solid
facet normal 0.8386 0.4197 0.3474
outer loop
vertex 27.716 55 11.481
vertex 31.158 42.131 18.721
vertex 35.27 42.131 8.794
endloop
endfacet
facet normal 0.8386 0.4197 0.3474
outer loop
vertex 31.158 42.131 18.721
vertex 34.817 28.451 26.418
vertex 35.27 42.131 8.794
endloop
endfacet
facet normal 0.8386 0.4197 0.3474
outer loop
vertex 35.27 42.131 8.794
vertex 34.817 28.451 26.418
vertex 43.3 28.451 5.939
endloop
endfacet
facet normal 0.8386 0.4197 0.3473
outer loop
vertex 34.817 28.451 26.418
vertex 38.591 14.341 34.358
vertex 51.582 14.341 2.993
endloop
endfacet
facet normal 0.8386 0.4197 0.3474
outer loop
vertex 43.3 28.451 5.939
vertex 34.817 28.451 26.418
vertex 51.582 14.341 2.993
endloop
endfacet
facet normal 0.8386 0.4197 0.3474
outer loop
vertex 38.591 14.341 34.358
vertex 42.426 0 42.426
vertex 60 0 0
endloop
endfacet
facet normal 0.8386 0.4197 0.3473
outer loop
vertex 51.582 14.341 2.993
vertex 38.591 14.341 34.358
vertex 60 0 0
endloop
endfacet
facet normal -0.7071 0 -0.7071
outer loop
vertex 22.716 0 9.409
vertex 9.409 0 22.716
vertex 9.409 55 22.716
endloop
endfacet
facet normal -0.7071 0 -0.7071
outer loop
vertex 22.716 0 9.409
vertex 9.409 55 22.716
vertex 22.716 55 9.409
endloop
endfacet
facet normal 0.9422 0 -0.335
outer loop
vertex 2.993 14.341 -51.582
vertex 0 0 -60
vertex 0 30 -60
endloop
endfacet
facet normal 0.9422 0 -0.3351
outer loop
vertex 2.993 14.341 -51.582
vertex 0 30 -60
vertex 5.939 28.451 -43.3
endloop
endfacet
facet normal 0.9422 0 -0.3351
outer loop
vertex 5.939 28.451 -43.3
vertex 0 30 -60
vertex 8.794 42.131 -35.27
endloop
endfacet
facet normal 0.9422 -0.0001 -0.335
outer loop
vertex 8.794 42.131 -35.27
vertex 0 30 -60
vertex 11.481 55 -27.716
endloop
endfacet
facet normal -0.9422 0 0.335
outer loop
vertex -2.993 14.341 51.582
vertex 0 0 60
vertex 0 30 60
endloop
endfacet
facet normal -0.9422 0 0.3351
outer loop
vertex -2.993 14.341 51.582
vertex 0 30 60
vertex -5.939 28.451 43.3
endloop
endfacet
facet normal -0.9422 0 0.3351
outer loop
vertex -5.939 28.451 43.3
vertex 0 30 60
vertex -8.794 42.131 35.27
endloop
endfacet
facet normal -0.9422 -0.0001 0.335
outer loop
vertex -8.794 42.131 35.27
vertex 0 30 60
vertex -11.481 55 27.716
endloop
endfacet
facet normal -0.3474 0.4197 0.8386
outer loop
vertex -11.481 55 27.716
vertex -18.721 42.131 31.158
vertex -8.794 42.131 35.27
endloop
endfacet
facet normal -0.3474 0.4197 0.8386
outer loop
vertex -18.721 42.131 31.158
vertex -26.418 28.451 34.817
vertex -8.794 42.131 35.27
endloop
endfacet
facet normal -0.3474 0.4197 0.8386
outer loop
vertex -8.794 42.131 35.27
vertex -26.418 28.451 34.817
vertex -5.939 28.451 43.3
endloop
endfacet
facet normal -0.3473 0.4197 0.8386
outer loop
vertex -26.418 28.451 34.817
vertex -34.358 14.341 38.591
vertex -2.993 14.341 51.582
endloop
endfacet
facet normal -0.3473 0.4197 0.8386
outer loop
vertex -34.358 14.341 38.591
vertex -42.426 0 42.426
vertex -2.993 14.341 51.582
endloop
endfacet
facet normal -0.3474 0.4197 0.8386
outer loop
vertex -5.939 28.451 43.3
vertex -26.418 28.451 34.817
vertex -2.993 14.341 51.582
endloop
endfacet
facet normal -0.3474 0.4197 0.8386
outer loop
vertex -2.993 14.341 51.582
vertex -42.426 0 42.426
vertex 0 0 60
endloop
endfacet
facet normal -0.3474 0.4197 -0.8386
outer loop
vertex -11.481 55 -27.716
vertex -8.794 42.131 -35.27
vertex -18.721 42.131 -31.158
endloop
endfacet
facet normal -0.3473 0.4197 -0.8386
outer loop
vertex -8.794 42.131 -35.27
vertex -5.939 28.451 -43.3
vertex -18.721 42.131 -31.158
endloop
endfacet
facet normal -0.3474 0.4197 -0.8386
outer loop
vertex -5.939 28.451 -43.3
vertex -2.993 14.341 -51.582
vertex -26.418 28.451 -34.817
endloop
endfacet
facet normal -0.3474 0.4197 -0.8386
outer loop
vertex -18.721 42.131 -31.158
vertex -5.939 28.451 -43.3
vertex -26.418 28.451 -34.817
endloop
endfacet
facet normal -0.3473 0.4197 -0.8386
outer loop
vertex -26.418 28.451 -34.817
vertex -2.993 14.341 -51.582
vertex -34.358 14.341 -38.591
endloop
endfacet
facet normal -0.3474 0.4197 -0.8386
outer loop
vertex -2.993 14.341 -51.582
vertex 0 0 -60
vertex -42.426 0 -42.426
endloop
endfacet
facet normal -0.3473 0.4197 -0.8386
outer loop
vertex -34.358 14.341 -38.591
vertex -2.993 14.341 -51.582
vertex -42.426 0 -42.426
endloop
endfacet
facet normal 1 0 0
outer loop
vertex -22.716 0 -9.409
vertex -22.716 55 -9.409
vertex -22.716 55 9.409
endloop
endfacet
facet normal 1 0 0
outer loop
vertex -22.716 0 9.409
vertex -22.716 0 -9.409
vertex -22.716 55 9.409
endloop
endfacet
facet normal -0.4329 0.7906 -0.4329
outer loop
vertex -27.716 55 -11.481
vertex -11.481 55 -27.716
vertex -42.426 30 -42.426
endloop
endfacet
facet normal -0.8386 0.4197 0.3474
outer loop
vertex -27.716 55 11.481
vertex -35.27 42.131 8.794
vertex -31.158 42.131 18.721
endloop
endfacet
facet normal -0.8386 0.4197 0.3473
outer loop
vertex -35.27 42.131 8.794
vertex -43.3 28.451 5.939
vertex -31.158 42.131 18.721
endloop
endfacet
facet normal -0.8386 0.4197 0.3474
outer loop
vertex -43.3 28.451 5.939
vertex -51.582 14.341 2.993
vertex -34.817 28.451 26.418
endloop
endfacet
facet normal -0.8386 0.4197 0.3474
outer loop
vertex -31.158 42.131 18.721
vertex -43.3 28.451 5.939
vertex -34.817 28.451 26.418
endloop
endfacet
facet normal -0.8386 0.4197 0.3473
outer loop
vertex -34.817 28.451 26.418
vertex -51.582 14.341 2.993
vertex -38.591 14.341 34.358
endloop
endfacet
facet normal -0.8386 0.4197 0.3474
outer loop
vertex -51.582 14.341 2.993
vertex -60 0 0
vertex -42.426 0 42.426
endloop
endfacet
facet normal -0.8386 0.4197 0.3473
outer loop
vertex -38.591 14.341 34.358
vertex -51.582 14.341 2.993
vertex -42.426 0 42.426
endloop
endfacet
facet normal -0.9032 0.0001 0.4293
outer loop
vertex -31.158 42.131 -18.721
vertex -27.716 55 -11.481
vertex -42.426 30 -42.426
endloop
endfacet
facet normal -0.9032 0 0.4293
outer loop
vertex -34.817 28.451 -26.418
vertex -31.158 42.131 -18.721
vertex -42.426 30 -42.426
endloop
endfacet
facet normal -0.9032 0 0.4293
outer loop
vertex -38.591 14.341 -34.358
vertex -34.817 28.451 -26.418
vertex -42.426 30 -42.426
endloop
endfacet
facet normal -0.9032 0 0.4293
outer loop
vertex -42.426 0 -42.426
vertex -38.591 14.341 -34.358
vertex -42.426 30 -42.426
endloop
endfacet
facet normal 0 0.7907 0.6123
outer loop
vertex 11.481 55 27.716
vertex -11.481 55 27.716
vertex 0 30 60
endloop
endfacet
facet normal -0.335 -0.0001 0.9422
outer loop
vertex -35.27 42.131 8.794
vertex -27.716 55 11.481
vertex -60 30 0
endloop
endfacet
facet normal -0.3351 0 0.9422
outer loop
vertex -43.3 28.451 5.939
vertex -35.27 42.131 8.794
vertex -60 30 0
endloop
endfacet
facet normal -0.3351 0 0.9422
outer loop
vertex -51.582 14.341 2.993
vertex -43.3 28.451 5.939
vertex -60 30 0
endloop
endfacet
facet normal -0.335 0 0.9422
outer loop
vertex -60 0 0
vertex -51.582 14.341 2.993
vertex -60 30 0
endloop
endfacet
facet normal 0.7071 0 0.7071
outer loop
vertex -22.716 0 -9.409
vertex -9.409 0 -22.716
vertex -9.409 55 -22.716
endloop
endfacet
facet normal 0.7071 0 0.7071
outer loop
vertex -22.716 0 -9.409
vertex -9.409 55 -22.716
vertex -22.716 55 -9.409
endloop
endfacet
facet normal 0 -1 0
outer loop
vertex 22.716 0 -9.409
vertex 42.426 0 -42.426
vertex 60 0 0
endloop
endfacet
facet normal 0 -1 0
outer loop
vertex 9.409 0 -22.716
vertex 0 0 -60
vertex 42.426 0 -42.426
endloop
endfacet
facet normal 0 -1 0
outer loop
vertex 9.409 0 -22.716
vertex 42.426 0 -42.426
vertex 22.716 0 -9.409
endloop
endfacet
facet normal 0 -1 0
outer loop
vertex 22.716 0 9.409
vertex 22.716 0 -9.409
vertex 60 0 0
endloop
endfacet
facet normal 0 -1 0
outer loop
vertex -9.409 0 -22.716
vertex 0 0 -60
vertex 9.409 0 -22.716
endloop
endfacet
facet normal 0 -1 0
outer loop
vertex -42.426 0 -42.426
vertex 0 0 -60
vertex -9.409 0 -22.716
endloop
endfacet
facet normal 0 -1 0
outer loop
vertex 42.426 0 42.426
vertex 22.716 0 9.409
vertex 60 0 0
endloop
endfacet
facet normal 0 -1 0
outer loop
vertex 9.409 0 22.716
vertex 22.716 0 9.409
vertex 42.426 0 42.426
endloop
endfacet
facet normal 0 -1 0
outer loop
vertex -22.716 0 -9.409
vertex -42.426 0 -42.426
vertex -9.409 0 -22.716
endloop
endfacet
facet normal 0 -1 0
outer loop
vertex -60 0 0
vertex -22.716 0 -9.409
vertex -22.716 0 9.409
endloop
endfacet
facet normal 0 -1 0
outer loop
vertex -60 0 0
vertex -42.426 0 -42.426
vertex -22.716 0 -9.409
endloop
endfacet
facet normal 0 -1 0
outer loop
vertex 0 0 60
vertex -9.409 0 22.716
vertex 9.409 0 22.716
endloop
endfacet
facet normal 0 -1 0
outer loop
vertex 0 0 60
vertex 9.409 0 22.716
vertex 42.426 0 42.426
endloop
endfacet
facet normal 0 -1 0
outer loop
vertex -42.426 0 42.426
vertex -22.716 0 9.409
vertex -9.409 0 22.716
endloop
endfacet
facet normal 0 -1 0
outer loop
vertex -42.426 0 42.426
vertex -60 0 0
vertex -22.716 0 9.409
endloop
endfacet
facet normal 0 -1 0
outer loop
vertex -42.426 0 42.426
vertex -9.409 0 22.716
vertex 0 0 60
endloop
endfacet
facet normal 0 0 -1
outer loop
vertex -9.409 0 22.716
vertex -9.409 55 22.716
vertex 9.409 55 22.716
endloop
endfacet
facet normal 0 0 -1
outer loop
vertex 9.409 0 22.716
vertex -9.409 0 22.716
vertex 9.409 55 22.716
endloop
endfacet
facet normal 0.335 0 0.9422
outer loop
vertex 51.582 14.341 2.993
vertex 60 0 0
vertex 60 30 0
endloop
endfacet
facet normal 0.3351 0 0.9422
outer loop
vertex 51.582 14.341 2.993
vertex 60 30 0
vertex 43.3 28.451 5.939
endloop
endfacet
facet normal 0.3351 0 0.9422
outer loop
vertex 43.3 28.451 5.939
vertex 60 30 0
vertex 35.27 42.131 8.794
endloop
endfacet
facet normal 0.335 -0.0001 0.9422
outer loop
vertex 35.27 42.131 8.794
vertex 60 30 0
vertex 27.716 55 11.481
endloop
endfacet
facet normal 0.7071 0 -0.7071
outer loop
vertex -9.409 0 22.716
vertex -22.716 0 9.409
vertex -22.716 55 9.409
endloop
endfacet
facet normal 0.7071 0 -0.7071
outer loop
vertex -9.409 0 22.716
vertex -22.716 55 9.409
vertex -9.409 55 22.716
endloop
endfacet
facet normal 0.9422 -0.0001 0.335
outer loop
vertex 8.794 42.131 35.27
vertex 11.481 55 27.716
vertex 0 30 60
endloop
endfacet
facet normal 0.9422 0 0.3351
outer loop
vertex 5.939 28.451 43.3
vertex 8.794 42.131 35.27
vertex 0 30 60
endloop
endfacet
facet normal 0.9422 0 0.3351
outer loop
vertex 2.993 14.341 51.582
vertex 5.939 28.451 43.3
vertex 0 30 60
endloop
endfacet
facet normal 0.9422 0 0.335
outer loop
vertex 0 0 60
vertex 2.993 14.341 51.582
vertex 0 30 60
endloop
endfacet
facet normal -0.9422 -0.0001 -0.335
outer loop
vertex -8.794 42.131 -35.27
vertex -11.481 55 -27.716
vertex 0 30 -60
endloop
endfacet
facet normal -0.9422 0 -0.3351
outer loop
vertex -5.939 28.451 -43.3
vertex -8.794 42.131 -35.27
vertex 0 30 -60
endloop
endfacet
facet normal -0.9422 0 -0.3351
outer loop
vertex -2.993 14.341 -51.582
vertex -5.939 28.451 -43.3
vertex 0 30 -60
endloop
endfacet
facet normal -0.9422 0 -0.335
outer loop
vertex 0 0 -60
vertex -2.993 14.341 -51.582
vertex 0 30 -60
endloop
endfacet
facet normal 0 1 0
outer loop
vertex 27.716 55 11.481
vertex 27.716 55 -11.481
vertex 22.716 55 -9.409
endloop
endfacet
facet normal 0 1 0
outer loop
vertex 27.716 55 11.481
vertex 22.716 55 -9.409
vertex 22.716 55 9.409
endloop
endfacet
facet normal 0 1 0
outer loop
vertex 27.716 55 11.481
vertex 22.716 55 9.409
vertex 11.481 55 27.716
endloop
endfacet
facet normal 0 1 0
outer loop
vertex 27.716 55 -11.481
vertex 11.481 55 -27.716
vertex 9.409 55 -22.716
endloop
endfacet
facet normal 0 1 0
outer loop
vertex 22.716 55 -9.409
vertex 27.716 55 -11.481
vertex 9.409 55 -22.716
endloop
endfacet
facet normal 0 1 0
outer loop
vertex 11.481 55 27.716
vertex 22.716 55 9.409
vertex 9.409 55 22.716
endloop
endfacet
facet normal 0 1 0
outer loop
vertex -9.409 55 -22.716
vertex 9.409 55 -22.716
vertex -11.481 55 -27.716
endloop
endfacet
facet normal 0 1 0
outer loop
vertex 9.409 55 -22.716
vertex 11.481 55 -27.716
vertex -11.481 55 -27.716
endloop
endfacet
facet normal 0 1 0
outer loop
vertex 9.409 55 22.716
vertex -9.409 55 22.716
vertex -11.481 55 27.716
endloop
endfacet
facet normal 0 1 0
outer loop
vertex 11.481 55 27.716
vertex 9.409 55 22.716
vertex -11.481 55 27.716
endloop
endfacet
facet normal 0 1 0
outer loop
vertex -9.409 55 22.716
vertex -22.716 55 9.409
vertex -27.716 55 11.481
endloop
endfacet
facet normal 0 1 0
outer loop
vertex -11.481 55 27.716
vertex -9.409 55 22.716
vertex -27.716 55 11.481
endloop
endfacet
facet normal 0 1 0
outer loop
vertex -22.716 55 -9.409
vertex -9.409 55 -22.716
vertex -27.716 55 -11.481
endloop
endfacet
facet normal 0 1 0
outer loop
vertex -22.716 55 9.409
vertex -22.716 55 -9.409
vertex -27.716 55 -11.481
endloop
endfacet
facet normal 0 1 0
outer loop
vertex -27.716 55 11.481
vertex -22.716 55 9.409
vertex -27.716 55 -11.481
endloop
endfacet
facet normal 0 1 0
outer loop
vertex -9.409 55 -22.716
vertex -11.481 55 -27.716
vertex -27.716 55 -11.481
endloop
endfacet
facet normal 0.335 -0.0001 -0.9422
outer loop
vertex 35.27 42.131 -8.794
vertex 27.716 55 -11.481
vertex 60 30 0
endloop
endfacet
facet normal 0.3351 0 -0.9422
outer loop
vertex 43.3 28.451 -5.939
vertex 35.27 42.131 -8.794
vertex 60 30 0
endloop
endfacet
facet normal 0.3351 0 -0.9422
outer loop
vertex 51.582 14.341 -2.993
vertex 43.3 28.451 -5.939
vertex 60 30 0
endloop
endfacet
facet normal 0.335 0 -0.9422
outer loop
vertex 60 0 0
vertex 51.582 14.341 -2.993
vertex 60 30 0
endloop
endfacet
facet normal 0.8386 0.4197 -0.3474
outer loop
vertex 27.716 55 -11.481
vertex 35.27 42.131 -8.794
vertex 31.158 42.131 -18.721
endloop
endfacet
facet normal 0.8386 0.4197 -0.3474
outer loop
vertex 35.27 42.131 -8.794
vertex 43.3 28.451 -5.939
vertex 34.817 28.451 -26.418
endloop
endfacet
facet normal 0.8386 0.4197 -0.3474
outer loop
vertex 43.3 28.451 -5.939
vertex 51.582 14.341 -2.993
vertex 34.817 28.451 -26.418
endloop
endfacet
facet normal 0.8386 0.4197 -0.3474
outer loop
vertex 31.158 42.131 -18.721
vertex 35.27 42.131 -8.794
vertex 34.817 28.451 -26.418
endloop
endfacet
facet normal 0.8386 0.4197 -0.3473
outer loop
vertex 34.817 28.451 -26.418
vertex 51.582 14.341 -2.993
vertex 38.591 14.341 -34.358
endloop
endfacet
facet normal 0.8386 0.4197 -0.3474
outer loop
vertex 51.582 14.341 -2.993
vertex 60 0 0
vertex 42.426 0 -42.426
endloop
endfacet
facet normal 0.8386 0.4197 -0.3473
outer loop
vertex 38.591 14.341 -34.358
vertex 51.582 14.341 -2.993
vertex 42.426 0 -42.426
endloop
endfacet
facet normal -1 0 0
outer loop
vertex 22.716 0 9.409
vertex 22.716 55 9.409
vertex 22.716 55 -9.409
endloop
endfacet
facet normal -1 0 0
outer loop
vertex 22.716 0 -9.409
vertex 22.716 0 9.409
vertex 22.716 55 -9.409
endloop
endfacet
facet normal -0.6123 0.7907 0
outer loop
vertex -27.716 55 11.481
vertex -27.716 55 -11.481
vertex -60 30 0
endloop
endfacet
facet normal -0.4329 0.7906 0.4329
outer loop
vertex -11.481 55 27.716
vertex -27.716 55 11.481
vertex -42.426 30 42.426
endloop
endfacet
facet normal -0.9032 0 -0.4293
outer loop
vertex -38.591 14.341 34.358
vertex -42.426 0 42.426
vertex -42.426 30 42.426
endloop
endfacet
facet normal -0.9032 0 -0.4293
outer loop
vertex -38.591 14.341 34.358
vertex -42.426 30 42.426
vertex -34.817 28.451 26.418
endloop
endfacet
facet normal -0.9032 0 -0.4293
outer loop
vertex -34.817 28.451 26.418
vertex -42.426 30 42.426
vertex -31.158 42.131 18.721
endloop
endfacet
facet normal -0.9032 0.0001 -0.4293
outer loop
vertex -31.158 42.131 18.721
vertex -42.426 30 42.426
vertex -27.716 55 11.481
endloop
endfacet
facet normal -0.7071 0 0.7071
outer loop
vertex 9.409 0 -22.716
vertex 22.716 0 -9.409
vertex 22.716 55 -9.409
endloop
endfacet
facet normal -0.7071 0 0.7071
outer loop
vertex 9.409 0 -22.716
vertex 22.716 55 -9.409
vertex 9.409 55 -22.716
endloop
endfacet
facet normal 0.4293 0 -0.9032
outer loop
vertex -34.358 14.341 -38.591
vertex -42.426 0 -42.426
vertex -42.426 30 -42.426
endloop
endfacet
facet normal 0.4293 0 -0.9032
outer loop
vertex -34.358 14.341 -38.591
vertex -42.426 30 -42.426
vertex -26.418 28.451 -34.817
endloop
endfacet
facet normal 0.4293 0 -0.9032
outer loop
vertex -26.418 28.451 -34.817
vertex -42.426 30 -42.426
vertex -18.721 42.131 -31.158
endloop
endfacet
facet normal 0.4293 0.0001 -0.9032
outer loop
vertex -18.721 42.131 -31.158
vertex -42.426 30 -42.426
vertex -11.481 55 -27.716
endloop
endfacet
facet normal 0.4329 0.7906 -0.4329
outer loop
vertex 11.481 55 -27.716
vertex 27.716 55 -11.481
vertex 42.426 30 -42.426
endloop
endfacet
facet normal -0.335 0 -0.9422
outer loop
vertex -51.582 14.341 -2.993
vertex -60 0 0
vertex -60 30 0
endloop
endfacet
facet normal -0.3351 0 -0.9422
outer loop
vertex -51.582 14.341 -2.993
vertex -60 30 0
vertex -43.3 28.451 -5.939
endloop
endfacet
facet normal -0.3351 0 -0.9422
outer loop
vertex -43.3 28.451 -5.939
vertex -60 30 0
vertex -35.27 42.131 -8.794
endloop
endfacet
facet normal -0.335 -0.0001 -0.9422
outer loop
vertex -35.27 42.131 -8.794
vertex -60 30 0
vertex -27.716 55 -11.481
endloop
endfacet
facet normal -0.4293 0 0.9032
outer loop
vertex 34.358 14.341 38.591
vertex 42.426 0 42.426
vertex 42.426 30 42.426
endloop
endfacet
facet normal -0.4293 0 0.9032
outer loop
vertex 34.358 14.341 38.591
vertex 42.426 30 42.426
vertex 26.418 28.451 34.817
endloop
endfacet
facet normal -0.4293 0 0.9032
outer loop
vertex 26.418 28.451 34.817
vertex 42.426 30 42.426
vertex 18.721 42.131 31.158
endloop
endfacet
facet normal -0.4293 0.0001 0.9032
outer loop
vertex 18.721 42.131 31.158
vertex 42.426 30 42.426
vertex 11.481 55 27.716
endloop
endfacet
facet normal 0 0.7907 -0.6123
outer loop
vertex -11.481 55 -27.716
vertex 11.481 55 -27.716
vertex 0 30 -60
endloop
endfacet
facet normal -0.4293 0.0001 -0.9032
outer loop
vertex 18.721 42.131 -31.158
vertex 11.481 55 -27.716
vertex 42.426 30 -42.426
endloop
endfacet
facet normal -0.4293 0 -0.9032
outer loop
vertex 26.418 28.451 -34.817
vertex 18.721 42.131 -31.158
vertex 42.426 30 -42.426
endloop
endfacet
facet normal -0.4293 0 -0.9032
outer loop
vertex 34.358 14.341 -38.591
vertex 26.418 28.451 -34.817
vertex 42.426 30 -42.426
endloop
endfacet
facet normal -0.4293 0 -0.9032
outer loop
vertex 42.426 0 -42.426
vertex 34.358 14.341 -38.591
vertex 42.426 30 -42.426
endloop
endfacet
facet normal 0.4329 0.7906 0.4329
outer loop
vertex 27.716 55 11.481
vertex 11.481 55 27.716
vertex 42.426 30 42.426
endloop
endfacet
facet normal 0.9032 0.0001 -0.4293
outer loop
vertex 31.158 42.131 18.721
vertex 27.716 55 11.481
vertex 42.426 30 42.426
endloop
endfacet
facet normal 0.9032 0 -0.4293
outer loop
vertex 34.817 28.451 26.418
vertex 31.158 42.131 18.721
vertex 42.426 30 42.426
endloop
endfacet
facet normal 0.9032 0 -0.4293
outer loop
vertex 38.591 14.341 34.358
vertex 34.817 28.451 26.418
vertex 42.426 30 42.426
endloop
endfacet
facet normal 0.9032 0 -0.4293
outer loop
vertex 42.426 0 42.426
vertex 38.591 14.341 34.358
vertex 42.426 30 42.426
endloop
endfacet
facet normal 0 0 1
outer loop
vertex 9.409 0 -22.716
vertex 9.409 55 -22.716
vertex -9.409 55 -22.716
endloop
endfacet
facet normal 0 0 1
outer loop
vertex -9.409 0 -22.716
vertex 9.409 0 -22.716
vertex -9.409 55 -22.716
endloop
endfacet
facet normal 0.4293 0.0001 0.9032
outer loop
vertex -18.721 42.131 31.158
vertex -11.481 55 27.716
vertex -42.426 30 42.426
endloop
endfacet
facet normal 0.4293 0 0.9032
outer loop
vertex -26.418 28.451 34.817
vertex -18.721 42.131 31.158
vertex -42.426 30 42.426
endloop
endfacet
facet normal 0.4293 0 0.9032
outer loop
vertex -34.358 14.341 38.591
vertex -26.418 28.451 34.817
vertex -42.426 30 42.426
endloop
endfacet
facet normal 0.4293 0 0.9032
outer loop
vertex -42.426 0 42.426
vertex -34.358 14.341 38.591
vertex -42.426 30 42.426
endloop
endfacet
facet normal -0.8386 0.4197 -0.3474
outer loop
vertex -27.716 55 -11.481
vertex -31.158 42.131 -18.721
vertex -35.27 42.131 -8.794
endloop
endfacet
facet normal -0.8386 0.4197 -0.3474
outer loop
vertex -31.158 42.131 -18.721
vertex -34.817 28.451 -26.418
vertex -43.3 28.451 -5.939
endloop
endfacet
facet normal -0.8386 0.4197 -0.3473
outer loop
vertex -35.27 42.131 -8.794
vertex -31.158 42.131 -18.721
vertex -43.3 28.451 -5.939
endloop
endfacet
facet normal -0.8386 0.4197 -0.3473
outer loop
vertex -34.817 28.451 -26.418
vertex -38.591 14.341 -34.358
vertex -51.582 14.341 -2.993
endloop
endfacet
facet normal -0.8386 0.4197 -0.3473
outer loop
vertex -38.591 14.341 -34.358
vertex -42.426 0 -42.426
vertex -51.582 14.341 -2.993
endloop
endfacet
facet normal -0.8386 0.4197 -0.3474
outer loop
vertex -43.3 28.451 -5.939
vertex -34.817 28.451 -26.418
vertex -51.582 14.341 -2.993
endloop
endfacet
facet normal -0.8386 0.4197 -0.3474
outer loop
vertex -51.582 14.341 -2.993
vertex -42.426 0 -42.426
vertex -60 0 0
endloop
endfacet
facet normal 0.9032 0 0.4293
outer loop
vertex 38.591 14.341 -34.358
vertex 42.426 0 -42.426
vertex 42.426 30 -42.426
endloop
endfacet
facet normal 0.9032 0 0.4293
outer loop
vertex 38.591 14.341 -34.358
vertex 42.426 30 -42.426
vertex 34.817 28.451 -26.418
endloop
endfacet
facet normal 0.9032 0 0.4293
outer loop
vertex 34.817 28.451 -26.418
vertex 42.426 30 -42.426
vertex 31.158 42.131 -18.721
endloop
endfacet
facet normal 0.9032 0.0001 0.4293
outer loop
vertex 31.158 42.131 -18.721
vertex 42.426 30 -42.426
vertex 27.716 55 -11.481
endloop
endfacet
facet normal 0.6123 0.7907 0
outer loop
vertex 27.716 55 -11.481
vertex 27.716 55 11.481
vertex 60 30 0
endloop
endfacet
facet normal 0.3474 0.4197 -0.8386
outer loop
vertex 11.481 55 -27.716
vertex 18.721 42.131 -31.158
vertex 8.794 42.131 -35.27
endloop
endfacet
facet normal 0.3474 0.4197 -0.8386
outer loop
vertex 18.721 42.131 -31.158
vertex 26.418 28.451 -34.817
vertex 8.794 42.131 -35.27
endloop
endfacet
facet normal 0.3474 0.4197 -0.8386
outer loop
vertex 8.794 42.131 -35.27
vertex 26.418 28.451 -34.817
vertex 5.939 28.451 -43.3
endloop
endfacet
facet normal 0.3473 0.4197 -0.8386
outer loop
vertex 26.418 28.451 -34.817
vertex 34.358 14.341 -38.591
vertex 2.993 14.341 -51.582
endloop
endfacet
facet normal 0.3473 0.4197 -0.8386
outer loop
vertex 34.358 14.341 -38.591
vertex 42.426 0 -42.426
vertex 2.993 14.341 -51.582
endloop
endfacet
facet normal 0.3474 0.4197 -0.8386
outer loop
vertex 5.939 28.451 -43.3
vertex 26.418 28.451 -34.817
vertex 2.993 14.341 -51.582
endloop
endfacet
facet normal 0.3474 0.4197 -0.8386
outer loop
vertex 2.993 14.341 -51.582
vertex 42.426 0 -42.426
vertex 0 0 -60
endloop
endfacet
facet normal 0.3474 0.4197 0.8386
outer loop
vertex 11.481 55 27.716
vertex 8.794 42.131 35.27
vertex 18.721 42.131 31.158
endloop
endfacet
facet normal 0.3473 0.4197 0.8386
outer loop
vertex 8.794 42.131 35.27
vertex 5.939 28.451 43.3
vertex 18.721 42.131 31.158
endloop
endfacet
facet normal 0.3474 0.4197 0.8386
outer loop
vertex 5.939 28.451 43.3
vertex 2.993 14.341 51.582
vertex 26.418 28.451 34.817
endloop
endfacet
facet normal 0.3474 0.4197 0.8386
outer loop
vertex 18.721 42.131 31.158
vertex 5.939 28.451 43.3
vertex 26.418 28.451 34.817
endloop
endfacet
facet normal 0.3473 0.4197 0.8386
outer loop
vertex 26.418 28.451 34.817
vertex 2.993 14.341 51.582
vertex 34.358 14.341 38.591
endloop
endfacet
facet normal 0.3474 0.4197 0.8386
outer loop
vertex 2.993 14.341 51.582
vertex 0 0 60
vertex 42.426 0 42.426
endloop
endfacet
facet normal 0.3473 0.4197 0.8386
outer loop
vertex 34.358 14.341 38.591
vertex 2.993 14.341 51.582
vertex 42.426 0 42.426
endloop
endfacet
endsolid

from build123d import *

# Parameters (mm, degrees)
EXTRUDE_1_REACH          = 103.119
CUT_EXTRUDE_2_DEPTH      = 102.118742254
PATTERN_CIRCULAR_2_COUNT = 8
CUT_EXTRUDE_3_DEPTH      = 102.118742254


with BuildPart() as part:
    # 草图7 → 放样4 section 0
    with BuildSketch(Plane(origin=(0, 55, 0), x_dir=(1, 0, 0), z_dir=(0, 1, 0))):
        with BuildLine():
            Line((0, 32.471766009), (-22.961005942, 22.961005942))
            Line((-22.961005942, 22.961005942), (-32.471766009, 0))
            Line((-32.471766009, 0), (-22.961005942, -22.961005942))
            Line((-22.961005942, -22.961005942), (0, -32.471766009))
            Line((0, -32.471766009), (22.961005942, -22.961005942))
            Line((22.961005942, -22.961005942), (32.471766009, 0))
            Line((32.471766009, 0), (22.961005942, 22.961005942))
            Line((22.961005942, 22.961005942), (0, 32.471766009))
        make_face()
    # 草图1 → 放样4 section 1
    with BuildSketch(Plane(origin=(0, 0, 0), x_dir=(1, 0, 0), z_dir=(0, 1, 0))):
        with BuildLine():
            Line((0, 60), (-42.426406871, 42.426406871))
            Line((-42.426406871, 42.426406871), (-60, 0))
            Line((-60, 0), (-42.426406871, -42.426406871))
            Line((-42.426406871, -42.426406871), (0, -60))
            Line((0, -60), (42.426406871, -42.426406871))
            Line((42.426406871, -42.426406871), (60, 0))
            Line((60, 0), (42.426406871, 42.426406871))
            Line((42.426406871, 42.426406871), (0, 60))
        make_face()
    loft()

    # 草图9 → 凸台-拉伸1 (add, up to next)
    with BuildSketch(Plane(origin=(0, 55, 0), x_dir=(1, 0, 0), z_dir=(0, 1, 0)), mode=Mode.PRIVATE) as extrude_1_sk1:
        Polygon((27.716385975, 11.480502971), (60, 0), (27.716385975, -11.480502971), align=None)
    extrude_1_tool1 = extrude(extrude_1_sk1.sketch, amount=-EXTRUDE_1_REACH, mode=Mode.PRIVATE) - part.part
    extrude_1 = extrude_1_tool1.solids().sort_by_distance((38.477591, 55, 0))[0]
    add(extrude_1)

    # 草图10 → 切除-拉伸2 (cut, symmetric)
    with BuildSketch(Plane.XY):
        Polygon((-175.786069036, 212.589586203), (27.716385975, 55), (60, 30), (263.502455012, -127.589586203), (578.681627419, 279.41532382), (139.39310337, 619.594496227), align=None)
    cut_extrude_2 = extrude(amount=CUT_EXTRUDE_2_DEPTH, both=True, mode=Mode.SUBTRACT)

    # 阵列(圆周)2: 凸台-拉伸1, 切除-拉伸2 ×8 about axis
    pattern_circular_2_axis = Axis((0, 58.101798211, 0), (0, -1, 0))
    add([extrude_1.rotate(pattern_circular_2_axis, i * 360 / PATTERN_CIRCULAR_2_COUNT) for i in range(1, PATTERN_CIRCULAR_2_COUNT)])
    add([cut_extrude_2.rotate(pattern_circular_2_axis, i * 360 / PATTERN_CIRCULAR_2_COUNT) for i in range(1, PATTERN_CIRCULAR_2_COUNT)], mode=Mode.SUBTRACT)

    # 草图12 → 切除-拉伸3 (cut, through all)
    with BuildSketch(Plane(origin=(0, 55, 0), x_dir=(1, 0, 0), z_dir=(0, 1, 0))):
        Polygon((22.716385975, -9.409435159), (22.716385975, 9.409435159), (9.409435159, 22.716385975), (-9.409435159, 22.716385975), (-22.716385975, 9.409435159), (-22.716385975, -9.409435159), (-9.409435159, -22.716385975), (9.409435159, -22.716385975), align=None)
    extrude(amount=-CUT_EXTRUDE_3_DEPTH, mode=Mode.SUBTRACT)


solid = part.part
